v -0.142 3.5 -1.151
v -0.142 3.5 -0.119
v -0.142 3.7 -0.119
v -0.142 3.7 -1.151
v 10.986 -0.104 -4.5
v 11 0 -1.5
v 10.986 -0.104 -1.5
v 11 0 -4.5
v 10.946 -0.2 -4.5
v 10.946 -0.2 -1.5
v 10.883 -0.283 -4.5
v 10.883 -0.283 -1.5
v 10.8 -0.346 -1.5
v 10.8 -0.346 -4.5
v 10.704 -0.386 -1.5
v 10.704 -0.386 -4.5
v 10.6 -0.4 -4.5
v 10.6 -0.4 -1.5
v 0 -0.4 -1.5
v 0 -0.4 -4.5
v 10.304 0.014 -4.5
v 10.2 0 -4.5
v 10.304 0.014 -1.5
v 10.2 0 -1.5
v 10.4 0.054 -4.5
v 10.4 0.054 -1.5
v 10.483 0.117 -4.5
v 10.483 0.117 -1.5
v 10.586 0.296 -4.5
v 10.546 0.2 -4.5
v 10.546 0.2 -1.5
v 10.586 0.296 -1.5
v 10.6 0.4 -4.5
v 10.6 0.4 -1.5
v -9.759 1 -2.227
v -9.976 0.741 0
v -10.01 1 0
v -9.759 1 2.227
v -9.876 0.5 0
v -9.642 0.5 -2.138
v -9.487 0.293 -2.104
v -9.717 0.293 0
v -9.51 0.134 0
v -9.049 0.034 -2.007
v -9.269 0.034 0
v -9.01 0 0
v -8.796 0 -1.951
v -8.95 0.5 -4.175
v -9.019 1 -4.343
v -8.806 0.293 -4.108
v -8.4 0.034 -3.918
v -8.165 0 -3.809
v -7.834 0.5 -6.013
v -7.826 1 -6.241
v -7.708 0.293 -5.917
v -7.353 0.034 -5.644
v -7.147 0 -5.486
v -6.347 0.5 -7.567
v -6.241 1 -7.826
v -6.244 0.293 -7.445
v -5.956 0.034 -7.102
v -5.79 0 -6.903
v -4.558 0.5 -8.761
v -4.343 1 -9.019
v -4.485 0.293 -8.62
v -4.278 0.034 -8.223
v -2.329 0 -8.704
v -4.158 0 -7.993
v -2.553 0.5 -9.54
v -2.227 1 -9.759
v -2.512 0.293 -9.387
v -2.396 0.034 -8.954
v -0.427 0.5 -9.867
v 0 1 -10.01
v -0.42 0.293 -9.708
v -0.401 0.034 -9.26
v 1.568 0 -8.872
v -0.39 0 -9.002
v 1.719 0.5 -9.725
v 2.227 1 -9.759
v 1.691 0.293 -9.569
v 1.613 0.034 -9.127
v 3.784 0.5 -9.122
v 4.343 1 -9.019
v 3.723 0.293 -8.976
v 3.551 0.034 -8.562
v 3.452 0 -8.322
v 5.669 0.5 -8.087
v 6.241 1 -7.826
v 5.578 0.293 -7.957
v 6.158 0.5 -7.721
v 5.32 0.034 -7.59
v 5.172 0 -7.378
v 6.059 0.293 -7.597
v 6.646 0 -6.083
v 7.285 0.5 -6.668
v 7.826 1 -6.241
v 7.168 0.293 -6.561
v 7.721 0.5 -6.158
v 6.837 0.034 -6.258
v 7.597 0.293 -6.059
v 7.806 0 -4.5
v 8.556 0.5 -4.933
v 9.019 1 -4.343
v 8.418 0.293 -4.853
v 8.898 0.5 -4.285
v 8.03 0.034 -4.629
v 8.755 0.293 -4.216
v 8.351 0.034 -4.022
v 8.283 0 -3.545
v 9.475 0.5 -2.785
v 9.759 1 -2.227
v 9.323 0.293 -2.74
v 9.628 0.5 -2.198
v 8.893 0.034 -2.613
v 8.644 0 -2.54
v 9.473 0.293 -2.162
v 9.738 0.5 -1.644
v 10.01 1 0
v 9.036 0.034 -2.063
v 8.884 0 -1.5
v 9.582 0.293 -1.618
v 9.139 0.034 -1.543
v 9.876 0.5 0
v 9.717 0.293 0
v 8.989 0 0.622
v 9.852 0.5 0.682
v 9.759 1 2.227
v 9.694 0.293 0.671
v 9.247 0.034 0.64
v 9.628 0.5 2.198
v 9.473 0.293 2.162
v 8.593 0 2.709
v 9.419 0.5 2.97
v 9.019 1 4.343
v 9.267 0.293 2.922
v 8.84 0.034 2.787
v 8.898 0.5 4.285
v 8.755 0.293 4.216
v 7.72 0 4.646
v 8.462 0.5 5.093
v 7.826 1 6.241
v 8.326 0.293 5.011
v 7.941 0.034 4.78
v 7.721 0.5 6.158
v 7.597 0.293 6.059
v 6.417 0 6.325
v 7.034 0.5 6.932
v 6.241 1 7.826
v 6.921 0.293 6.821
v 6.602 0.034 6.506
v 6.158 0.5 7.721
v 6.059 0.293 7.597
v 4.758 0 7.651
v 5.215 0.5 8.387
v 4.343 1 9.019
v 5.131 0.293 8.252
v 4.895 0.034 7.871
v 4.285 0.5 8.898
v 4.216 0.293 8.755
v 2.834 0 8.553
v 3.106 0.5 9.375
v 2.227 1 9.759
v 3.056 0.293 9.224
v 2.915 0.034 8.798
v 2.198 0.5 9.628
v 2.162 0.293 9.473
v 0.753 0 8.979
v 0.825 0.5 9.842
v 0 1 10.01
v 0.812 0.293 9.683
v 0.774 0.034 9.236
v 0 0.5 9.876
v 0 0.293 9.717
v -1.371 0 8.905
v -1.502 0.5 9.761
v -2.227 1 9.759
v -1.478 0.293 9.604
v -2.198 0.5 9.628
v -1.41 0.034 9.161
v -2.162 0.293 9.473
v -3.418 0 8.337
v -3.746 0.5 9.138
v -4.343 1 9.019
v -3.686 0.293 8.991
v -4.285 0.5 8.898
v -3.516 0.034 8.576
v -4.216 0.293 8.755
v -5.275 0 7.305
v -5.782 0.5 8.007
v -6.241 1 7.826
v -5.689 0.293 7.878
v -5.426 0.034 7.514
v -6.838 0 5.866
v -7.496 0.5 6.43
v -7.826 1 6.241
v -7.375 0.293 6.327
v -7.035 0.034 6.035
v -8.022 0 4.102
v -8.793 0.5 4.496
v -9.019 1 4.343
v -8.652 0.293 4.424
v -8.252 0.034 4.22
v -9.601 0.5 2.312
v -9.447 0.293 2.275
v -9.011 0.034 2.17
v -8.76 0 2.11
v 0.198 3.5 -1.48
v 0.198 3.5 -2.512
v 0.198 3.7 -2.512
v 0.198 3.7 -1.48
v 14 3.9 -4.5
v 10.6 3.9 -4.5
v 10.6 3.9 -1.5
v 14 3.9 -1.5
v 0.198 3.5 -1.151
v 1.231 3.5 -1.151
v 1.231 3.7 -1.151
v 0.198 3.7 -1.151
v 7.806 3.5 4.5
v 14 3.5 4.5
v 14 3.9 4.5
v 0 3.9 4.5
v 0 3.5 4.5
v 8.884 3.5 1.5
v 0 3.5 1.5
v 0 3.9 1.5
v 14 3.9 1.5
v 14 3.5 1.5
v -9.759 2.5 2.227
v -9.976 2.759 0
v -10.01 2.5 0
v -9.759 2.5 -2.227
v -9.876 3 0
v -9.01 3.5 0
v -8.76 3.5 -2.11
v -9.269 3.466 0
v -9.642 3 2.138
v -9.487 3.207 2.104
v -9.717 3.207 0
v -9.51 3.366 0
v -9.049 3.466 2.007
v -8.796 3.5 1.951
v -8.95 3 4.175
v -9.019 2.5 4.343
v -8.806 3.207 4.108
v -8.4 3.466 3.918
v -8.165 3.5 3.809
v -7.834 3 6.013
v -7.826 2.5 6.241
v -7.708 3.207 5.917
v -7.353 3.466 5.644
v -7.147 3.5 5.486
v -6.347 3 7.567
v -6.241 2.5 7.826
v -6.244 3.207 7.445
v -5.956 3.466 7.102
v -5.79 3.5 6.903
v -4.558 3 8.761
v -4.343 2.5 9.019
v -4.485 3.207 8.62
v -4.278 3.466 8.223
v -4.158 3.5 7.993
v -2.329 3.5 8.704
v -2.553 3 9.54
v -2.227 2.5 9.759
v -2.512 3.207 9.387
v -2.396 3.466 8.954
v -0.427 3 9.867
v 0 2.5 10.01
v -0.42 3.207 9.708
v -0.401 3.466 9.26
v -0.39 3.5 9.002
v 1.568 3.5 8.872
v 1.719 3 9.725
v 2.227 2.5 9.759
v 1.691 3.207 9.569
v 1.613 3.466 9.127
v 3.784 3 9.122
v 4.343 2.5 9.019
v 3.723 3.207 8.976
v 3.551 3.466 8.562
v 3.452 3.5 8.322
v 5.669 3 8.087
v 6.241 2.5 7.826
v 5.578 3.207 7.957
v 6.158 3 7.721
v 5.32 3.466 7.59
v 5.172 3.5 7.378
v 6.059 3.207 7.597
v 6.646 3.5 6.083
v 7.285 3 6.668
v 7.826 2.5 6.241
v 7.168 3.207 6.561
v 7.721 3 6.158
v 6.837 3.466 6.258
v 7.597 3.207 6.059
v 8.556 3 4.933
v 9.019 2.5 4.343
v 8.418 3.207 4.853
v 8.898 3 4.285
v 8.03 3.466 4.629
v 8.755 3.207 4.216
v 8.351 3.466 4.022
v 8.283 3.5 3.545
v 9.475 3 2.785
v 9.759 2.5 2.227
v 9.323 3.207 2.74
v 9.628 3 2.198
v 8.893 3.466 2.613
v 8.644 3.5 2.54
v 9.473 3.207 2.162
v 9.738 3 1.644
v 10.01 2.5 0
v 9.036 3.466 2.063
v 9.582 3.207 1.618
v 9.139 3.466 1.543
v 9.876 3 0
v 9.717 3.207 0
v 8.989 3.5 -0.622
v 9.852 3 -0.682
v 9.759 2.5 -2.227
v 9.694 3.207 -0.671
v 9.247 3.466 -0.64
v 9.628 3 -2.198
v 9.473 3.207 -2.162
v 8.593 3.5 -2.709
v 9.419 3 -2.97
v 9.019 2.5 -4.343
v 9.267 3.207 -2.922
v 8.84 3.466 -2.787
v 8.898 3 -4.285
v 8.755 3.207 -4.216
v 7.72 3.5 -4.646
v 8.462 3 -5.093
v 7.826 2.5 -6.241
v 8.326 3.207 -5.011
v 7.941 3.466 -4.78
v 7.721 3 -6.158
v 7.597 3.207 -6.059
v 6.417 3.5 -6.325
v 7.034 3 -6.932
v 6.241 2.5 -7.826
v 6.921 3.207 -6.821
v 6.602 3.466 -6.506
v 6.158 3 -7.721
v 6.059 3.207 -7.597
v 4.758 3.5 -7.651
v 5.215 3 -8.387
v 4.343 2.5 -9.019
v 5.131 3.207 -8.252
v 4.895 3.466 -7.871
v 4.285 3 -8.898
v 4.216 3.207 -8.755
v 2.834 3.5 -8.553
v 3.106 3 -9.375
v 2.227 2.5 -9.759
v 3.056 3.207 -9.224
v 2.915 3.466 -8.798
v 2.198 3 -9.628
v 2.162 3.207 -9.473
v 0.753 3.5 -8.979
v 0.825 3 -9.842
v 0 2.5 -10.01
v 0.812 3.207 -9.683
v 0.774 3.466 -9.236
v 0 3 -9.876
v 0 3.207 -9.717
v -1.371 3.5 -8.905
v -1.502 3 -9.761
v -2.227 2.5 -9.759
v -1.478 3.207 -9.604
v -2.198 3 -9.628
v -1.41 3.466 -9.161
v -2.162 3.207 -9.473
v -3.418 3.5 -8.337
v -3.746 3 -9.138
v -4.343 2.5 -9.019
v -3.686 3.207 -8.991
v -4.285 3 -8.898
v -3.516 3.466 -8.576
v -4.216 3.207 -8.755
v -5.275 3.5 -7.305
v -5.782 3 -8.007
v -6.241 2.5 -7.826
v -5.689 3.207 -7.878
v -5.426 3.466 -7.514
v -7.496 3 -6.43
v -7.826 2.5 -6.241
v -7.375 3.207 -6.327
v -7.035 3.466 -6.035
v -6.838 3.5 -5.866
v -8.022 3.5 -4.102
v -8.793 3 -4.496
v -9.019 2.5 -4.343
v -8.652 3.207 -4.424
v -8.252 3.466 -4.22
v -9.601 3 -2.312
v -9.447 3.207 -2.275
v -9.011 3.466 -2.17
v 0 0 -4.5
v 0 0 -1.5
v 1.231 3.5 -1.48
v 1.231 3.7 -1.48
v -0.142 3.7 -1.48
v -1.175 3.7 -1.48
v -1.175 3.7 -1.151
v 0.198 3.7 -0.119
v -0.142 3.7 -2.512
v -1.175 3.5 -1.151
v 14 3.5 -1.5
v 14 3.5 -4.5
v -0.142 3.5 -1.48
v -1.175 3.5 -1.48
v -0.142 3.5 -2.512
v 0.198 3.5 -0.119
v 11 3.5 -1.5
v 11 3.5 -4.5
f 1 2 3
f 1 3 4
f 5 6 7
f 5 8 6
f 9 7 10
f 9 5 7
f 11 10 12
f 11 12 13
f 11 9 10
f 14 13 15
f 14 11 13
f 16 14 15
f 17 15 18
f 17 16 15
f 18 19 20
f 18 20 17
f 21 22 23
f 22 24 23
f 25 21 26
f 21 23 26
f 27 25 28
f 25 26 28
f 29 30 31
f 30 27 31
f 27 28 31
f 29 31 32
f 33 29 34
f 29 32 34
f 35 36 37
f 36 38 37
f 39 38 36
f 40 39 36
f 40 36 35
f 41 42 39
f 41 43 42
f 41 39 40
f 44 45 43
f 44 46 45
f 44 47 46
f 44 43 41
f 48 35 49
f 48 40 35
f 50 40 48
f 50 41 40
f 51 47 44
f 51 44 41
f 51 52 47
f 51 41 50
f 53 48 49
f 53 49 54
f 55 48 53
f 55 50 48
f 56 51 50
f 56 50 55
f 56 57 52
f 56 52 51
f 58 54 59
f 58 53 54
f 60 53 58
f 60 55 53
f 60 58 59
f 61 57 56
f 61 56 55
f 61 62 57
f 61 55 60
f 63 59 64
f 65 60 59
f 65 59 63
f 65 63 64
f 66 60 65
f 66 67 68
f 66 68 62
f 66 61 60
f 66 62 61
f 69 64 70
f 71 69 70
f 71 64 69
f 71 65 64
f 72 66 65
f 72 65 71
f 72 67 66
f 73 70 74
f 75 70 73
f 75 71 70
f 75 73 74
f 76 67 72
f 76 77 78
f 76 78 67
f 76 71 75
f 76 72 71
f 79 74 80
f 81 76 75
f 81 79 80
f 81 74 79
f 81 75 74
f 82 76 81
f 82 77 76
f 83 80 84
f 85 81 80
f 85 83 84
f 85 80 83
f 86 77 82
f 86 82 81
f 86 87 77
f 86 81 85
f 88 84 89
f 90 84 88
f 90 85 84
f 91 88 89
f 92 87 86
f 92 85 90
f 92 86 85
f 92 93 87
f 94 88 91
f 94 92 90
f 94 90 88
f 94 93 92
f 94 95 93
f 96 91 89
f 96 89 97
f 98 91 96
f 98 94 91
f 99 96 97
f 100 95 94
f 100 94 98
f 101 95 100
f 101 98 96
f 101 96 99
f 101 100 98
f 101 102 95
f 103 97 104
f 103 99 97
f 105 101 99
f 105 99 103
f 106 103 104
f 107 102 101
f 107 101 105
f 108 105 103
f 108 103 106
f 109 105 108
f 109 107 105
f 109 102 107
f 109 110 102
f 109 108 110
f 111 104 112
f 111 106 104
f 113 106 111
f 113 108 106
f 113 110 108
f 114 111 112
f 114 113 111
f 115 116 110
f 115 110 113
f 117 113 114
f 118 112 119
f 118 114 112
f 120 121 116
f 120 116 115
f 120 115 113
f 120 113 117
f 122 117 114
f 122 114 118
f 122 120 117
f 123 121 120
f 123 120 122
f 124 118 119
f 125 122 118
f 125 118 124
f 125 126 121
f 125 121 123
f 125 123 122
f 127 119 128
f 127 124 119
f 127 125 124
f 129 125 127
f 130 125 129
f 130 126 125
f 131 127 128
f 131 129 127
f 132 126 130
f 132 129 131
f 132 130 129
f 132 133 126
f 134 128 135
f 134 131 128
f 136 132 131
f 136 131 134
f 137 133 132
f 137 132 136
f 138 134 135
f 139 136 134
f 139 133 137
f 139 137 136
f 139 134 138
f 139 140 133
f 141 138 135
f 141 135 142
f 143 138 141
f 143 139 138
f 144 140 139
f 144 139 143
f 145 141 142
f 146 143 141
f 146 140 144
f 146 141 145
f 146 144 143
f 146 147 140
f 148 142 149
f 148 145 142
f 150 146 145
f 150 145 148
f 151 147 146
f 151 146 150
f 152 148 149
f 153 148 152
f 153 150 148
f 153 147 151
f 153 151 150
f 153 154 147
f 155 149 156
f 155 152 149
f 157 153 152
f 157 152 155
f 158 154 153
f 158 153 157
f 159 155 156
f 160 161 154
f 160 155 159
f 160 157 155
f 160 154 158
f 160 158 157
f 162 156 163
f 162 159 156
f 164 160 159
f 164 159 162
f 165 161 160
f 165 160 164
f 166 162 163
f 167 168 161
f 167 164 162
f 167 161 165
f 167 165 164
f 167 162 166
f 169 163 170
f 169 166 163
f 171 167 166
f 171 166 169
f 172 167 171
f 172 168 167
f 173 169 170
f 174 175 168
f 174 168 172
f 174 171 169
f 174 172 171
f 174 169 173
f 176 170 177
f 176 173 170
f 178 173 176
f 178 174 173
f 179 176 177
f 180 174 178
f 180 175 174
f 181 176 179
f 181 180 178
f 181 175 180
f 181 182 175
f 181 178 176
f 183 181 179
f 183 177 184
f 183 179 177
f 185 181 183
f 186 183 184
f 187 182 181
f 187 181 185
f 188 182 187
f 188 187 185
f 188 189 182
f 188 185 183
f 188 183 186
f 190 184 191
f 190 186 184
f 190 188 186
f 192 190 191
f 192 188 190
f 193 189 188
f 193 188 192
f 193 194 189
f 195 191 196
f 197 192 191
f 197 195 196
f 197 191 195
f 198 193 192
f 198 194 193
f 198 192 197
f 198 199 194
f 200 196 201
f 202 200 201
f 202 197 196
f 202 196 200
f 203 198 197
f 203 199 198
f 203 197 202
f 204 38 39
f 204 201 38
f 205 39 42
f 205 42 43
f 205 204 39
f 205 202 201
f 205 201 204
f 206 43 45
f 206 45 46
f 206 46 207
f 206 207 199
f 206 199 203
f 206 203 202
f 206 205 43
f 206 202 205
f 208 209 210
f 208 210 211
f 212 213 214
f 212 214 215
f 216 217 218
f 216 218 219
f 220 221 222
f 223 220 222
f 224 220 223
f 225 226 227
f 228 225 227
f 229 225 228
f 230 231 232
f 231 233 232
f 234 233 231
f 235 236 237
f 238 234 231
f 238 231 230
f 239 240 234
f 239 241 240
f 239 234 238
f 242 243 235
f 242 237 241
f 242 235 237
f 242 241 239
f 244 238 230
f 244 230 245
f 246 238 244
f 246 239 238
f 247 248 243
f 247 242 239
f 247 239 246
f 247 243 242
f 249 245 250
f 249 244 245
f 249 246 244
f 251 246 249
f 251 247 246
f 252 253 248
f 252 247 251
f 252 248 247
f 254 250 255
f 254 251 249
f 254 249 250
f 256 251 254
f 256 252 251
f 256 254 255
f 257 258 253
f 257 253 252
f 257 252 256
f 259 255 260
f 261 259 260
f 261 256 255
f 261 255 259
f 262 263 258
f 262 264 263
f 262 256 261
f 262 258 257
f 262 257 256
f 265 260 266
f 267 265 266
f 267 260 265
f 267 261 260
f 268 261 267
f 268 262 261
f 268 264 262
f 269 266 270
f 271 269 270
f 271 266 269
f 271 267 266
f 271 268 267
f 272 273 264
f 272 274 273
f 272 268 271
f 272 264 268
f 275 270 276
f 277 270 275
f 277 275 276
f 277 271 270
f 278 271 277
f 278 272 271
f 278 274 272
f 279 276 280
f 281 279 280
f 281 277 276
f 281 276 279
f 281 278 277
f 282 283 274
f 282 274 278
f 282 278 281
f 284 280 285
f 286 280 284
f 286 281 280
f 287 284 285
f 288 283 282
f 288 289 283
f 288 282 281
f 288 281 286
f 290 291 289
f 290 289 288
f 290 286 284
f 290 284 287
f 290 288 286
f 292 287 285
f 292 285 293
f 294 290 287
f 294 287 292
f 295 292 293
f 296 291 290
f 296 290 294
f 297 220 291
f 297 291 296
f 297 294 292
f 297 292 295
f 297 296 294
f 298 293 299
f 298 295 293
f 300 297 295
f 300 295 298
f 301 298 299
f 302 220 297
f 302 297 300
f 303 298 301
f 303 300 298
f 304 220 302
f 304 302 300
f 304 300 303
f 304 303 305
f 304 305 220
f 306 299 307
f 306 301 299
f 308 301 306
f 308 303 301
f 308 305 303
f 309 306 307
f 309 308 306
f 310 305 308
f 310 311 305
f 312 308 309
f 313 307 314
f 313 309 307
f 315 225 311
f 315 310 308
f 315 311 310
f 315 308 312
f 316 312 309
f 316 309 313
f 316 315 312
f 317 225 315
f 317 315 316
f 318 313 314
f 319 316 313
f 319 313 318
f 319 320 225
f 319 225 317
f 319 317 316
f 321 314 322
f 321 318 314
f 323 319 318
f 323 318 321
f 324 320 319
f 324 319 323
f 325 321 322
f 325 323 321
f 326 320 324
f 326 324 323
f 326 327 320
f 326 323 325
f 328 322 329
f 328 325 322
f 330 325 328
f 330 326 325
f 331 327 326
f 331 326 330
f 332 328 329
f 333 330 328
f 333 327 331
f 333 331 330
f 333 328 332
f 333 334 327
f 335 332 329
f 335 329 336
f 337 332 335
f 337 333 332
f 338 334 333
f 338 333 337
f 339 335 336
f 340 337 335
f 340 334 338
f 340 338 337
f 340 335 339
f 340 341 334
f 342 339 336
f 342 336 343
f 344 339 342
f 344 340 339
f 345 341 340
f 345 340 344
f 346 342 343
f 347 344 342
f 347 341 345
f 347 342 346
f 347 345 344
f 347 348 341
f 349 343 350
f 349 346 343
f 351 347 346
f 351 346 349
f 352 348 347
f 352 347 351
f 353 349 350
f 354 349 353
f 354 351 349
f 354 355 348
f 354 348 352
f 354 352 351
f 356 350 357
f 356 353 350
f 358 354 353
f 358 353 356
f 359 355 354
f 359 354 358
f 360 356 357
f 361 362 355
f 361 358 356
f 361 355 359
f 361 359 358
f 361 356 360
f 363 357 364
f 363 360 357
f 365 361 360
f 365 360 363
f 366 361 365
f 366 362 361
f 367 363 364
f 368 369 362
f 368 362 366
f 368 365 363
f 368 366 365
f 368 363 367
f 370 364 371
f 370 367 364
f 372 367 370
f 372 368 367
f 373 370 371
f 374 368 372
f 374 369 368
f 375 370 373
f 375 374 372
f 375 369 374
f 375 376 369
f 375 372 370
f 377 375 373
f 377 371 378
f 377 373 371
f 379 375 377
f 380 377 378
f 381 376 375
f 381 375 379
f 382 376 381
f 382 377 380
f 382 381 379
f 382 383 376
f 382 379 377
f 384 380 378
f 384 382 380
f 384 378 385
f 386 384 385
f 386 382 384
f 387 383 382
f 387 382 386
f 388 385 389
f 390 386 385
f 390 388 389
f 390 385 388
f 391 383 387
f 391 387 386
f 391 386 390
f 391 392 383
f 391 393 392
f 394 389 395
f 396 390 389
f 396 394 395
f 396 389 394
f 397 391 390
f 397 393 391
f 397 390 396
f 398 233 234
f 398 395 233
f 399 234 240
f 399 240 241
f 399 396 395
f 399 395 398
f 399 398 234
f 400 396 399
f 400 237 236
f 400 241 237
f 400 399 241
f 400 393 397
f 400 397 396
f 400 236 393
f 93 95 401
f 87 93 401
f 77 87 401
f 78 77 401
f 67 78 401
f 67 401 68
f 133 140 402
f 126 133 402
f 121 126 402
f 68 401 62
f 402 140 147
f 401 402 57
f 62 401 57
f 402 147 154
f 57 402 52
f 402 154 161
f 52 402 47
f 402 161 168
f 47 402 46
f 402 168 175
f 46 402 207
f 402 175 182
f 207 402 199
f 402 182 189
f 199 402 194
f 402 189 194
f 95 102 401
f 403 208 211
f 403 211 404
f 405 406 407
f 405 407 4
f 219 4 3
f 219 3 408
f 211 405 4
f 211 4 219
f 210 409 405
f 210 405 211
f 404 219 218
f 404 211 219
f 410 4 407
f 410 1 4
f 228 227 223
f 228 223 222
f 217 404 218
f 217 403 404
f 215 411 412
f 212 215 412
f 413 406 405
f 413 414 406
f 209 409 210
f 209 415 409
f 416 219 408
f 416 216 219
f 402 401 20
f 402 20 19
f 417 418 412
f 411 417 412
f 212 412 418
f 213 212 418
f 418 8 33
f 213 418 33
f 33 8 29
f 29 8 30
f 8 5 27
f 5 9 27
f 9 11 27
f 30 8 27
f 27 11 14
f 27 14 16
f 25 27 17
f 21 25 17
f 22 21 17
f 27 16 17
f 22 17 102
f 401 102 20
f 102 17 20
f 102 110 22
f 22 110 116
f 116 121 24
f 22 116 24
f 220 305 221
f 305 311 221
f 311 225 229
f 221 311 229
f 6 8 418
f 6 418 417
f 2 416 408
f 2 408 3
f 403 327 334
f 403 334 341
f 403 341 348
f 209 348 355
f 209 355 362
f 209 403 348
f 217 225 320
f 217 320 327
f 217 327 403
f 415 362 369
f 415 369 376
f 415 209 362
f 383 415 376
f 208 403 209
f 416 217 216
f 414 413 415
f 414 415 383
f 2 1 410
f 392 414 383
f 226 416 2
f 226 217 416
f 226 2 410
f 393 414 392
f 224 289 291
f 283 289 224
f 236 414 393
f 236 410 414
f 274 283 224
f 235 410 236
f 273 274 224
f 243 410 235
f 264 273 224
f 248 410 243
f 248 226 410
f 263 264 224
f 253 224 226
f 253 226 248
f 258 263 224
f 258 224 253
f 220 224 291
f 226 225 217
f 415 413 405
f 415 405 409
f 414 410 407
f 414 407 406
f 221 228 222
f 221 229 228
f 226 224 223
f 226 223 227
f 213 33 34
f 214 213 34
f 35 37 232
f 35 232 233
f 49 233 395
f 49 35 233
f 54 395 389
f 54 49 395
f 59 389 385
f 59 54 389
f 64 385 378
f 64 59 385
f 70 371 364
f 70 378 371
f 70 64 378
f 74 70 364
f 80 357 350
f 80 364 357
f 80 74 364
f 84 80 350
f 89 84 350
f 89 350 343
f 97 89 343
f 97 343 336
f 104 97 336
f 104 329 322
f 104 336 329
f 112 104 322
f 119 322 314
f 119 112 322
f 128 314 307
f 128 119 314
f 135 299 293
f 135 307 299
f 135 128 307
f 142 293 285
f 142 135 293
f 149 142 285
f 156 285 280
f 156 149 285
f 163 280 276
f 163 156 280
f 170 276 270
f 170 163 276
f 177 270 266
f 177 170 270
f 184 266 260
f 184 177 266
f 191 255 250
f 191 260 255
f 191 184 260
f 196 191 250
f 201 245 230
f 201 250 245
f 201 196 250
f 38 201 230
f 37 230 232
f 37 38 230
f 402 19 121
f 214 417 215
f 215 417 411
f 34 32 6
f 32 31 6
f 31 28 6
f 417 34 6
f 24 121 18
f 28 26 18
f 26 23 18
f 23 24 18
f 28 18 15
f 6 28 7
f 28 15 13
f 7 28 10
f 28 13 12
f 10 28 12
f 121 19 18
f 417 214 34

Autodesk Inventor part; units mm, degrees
ref_plane "YZ Plane" through (0, 0, 0) normal (1, 0, 0) x (0, 1, 0)
ref_plane "XZ Plane" through (0, 0, 0) normal (0, 1, 0) x (-1, 0, 0)
ref_plane "XY Plane" through (0, 0, 0) normal (0, 0, 1) x (1, 0, 0)
sketch "Sketch1" plane through (0, 0, 0) normal (0, 1, 0) x (-1, 0, 0)
  circle A0 centre (0, 0) radius 10.01
  dimension "d0" = 20.02
extrude "Extrusion1" add sketch "Sketch1" along normal blind 3.5
fillet "Fillet1" radius 1 1 edges at (10.01, 3.5, 0)
fillet "Fillet2" radius 1 1 edges at (10.01, 0, 0)
sketch "Sketch2" plane through (0, 3.5, 0) normal (0, 1, 0) x (1, 0, 0)
  line L0 (0, 0) -> (0, -1.5)
  line L1 (0, -1.5) -> (14, -1.5)
  line L2 (14, -1.5) -> (14, -4.5)
  line L3 (14, -4.5) -> (0, -4.5)
  line L4 (0, -4.5) -> (0, -1.5)
  dimension "d5" = 1.5
  dimension "d6" = 14
  dimension "d7" = 3
extrude "Extrusion2" add sketch "Sketch2" along normal blind 0.4
sketch "Sketch3" plane through (0, 0, 0) normal (0, -1, 0) x (1, 0, 0)
  line L0 (0, 0) -> (0, -1.5)
  line L1 (0, -1.5) -> (11, -1.5)
  line L2 (11, -1.5) -> (11, -4.5)
  line L3 (11, -4.5) -> (0, -4.5)
  line L4 (0, -4.5) -> (0, -1.5)
  dimension "d10" = 1.5
  dimension "d11" = 11
  dimension "d12" = 3
extrude "Extrusion3" add sketch "Sketch3" along normal blind 0.4
sketch "Sketch4" plane through (0, 0, 0) normal (0, 1, 0) x (1, 0, 0)
  line L0 (11, 4.5) -> (11, 1.5) projected
  line L1 (11, 1.5) -> (11, 4.5)
  line L2 (11, 4.5) -> (10.6, 4.5)
  line L3 (10.6, 4.5) -> (10.6, 1.5)
  line L4 (10.6, 1.5) -> (11, 1.5)
  point P0 (0, 0)
  dimension "d15" = 0.4
extrude "Extrusion4" add sketch "Sketch4" along normal blind 3.5
fillet "Fillet3" radius 0.4 1 edges at (11, -0.4, -3)
fillet "Fillet4" radius 0.4 1 edges at (10.6, 0, -3)
sketch "Sketch5" plane through (0, 3.5, 0) normal (0, 1, 0) x (1, 0, 0)
  line L0 (10.6, 4.5) -> (10.6, 1.5) projected
  line L1 (10.6, 1.5) -> (14, 1.5)
  line L2 (14, 1.5) -> (14, 4.5)
  line L3 (14, 4.5) -> (10.6, 4.5)
  line L4 (10.6, 4.5) -> (10.6, 1.5)
  point P0 (0, 0)
  dimension "d20" = 3
  dimension "d21" = 3.4
extrude "Extrusion5" add sketch "Sketch5" along normal blind 0.4
sketch "Sketch6" plane through (0, 3.5, 0) normal (0, 1, 0) x (1, 0, 0)
  line L0 (-1.4984, 2.512) -> (1.5521, 2.512) construction
  line L1 (1.5521, 2.512) -> (1.5521, 0.1186) construction
  line L2 (1.5521, 0.1186) -> (-1.4984, 0.1186) construction
  line L3 (-1.4984, 0.1186) -> (-1.4984, 2.512) construction
  line L4 (1.231, 1.1511) -> (0.1985, 1.1511)
  line L5 (0.1985, 1.1511) -> (0.1985, 0.1186)
  line L6 (0.1985, 0.1186) -> (-0.1424, 0.1186)
  line L7 (-0.1424, 0.1186) -> (-0.1424, 1.1511)
  line L8 (-0.1424, 1.1511) -> (-1.1748, 1.1511)
  line L9 (-1.1748, 1.1511) -> (-1.1748, 1.4796)
  line L10 (-1.1748, 1.4796) -> (-0.1424, 1.4796)
  line L11 (-0.1424, 1.4796) -> (-0.1424, 2.512)
  line L12 (-0.1424, 2.512) -> (0.1985, 2.512)
  line L13 (0.1985, 2.512) -> (0.1985, 1.4796)
  line L14 (0.1985, 1.4796) -> (1.231, 1.4796)
  line L15 (1.231, 1.4796) -> (1.231, 1.1511)
  point P0 (0, 0)
extrude "Extrusion6" add sketch "Sketch6" along normal mid plane 0.4
properties part number "RJD2032C1ST1"
